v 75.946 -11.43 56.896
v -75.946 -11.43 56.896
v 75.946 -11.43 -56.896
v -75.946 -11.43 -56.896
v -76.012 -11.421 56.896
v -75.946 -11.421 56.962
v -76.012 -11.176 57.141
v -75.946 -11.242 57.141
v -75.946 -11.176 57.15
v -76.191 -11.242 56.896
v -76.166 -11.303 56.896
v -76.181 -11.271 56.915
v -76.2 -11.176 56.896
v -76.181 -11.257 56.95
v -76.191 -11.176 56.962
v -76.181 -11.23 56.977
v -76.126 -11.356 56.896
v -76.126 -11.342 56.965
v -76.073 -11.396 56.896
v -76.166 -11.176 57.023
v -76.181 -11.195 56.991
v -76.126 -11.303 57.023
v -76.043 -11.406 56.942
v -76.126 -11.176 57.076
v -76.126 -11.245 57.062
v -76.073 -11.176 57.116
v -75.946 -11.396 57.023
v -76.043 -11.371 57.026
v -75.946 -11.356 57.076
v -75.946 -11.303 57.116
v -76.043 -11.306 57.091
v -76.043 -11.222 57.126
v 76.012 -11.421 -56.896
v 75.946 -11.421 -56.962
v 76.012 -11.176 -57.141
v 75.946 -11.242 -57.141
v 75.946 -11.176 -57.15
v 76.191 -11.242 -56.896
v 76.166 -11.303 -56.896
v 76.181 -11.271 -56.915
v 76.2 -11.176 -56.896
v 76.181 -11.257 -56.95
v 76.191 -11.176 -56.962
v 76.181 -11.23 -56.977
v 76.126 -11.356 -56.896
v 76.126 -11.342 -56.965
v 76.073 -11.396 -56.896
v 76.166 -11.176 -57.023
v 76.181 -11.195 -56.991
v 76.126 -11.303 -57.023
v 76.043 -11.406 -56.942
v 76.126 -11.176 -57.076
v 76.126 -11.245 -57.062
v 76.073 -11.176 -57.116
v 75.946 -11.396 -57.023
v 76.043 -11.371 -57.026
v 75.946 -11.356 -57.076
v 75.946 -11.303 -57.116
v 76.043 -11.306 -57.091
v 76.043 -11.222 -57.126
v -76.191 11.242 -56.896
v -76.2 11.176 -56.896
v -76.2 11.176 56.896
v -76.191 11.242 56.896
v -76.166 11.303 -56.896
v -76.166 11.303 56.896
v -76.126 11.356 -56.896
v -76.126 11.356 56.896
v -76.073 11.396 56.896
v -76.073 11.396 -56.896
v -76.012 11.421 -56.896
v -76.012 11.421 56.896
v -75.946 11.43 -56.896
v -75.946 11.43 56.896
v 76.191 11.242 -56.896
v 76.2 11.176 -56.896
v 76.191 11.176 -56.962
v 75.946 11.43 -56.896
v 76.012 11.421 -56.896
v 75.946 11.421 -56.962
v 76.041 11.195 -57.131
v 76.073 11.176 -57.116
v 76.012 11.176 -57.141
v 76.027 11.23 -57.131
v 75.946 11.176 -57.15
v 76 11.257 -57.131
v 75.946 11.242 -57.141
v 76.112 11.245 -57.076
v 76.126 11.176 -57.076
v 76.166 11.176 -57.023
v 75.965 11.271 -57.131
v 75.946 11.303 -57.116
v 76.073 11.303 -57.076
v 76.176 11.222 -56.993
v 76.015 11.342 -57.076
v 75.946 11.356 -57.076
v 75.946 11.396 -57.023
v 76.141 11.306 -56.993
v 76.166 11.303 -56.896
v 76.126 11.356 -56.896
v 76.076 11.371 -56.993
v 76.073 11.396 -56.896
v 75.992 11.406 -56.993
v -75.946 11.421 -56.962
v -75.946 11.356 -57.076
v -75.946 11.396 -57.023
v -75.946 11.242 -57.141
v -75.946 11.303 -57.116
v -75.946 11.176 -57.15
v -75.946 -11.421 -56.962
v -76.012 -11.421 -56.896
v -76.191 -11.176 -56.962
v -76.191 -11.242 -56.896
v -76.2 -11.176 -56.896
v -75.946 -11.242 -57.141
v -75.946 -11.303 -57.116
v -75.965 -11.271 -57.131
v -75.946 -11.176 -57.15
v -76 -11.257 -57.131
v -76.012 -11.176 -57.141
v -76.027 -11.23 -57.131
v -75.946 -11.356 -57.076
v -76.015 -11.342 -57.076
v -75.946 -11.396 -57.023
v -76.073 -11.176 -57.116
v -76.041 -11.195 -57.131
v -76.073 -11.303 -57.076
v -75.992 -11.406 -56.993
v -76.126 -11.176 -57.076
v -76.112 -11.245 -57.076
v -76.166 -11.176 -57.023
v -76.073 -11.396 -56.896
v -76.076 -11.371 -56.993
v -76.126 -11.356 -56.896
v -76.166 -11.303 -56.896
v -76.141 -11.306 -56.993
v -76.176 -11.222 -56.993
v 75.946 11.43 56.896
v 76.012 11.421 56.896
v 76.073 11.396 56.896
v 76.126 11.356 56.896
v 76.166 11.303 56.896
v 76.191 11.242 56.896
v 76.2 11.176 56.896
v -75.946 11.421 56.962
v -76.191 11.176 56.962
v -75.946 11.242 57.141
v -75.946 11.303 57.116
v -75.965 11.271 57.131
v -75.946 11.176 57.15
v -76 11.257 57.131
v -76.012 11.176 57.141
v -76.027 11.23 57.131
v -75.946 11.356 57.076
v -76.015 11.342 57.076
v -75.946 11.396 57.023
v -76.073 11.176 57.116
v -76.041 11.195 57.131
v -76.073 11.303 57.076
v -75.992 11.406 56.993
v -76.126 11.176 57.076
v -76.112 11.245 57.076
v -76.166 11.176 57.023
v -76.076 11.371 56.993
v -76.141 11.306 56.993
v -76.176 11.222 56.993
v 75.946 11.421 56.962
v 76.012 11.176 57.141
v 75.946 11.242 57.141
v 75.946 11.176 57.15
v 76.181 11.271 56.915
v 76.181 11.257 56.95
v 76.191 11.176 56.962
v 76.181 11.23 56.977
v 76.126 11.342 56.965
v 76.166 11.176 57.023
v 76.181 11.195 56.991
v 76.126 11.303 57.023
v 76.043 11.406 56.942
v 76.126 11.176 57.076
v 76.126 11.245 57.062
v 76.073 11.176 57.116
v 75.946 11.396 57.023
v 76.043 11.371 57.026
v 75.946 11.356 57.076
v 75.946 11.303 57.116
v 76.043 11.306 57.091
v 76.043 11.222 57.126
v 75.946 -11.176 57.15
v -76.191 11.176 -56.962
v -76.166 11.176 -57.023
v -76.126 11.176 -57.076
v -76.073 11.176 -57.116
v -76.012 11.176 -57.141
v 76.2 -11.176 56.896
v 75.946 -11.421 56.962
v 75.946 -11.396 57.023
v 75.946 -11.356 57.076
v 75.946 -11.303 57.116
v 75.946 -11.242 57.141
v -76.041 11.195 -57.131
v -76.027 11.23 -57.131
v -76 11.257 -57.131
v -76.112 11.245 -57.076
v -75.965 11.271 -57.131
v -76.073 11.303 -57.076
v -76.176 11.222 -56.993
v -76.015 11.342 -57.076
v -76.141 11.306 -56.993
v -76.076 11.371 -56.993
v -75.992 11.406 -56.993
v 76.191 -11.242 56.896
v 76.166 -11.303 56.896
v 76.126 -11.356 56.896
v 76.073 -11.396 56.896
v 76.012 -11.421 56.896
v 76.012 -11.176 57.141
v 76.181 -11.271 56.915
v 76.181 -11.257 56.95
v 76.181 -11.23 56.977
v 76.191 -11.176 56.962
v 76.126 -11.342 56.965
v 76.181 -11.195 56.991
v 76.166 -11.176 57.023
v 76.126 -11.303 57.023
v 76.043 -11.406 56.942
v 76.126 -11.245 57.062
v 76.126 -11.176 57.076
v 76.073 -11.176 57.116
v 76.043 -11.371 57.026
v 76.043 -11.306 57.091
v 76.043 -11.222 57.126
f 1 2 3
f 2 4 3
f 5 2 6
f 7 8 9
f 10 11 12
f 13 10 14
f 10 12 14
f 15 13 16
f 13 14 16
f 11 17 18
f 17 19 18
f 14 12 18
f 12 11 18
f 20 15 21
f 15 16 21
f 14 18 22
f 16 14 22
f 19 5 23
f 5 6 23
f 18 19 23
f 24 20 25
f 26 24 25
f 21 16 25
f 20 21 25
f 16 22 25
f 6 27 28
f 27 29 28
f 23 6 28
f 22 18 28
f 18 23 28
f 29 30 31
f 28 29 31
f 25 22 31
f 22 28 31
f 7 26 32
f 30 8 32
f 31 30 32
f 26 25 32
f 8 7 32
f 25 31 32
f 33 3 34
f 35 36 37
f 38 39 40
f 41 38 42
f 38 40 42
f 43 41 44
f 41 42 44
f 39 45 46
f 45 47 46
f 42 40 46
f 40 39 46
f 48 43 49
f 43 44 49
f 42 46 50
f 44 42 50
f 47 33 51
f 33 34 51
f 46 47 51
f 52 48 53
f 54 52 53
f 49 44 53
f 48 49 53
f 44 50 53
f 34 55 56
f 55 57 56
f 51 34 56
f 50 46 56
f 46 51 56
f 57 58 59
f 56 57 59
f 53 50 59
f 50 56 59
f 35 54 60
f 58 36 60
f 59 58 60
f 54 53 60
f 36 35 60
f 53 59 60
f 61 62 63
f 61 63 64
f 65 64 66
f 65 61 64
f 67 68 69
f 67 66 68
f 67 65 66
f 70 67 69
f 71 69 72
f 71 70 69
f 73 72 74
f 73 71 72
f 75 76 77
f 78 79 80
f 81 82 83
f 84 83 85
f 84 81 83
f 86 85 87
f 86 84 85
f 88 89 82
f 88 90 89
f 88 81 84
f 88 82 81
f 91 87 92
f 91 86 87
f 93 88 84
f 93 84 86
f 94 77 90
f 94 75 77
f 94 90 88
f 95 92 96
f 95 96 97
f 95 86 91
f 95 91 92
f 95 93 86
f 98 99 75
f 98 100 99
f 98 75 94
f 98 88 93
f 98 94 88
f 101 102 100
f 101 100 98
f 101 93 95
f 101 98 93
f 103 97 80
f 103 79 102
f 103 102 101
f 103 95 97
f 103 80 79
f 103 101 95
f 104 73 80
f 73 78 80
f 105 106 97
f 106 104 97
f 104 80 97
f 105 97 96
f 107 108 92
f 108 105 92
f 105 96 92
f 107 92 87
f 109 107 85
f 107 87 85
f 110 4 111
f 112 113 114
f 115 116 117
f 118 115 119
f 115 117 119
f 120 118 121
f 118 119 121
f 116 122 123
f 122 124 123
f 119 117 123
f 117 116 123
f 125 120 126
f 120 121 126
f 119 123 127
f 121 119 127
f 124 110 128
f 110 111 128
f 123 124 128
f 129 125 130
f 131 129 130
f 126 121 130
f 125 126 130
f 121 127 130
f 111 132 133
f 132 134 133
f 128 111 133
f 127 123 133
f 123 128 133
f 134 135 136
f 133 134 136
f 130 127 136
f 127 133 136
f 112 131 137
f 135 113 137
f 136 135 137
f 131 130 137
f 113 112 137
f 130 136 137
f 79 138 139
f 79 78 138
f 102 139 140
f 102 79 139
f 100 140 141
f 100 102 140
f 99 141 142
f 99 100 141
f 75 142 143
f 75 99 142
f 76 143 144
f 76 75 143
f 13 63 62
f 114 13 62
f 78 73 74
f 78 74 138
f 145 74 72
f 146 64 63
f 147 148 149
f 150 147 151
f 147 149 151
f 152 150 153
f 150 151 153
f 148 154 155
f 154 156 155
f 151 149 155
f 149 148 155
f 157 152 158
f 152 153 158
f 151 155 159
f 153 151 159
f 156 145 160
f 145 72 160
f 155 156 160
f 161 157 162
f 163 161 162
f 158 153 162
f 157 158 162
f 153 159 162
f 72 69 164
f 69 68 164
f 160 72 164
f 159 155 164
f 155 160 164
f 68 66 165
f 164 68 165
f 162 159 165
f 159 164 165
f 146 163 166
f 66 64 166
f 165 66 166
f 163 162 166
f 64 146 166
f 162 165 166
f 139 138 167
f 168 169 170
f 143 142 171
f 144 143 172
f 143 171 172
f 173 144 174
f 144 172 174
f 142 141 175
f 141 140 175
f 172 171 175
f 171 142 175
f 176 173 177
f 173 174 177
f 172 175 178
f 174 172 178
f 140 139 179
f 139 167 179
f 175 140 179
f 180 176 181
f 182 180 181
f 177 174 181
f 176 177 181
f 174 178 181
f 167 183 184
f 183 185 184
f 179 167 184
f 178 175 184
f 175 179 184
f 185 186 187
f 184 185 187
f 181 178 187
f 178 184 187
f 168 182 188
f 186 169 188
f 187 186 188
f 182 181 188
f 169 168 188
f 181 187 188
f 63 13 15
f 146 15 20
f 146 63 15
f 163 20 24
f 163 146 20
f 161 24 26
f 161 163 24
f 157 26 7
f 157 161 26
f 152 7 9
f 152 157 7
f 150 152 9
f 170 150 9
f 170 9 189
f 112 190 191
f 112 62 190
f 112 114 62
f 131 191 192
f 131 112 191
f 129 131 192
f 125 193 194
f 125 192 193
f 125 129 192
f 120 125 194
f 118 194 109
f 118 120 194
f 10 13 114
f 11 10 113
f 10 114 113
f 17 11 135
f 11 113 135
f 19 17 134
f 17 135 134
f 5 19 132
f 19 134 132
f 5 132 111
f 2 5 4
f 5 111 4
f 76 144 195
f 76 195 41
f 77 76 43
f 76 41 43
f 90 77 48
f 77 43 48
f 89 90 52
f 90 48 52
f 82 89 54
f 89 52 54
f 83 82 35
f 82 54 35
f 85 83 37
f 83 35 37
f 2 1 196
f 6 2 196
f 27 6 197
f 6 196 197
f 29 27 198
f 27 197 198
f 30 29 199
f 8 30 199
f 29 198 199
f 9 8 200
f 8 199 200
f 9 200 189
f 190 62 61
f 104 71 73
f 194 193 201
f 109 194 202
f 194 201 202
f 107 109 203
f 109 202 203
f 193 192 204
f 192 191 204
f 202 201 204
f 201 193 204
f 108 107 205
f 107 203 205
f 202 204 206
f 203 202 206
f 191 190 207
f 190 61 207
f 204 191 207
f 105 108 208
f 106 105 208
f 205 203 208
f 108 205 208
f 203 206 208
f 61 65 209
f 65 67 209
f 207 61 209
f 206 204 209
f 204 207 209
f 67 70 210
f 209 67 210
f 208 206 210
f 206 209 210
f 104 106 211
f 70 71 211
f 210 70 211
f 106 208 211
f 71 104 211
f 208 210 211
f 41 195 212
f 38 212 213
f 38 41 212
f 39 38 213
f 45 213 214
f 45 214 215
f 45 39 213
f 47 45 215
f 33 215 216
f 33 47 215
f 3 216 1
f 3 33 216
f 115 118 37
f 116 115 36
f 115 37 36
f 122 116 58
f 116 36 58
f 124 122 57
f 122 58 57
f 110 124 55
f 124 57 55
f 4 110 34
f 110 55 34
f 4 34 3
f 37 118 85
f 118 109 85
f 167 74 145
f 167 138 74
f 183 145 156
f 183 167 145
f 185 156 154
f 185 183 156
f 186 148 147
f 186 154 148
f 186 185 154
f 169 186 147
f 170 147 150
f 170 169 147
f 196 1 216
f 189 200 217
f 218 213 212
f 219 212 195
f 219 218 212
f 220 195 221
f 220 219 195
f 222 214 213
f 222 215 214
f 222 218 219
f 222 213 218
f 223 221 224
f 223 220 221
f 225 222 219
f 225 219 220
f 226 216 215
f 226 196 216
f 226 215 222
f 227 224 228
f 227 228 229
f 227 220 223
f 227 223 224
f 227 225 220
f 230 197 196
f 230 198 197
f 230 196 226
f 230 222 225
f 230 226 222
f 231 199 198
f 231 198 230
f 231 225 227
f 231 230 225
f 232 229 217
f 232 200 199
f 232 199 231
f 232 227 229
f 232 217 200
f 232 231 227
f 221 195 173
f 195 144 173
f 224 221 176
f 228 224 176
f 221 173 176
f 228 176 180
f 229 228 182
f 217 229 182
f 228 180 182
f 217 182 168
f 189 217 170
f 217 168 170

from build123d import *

# Parameters (mm, degrees)
SKETCH1_W           = 152.4
SKETCH1_H           = 114.3
BOSS_EXTRUDE1_DEPTH = 11.43
FILLET1_R           = 0.254


with BuildPart() as part:
    # Sketch1 → Boss-Extrude1 (new body, symmetric)
    with BuildSketch(Plane(origin=(0, 0, 0), x_dir=(1, 0, 0), z_dir=(0, 1, 0))):
        Rectangle(SKETCH1_W, SKETCH1_H)
    extrude(amount=BOSS_EXTRUDE1_DEPTH, both=True)

    # Fillet1
    fillet1_edges = [part.edges().sort_by_distance(p)[0] for p in [
        (-76.2, 11.43, 0),
        (0, 11.43, 57.15),
        (76.2, 11.43, 0),
        (0, -11.43, 57.15),
        (-76.2, -11.43, 0),
        (0, -11.43, -57.15),
        (76.2, -11.43, 0),
        (76.2, 0, 57.15),
        (-76.2, 0, 57.15),
        (-76.2, 0, -57.15),
        (76.2, 0, -57.15),
        (0, 11.43, -57.15),
    ]]
    fillet(fillet1_edges, radius=FILLET1_R)


solid = part.part
